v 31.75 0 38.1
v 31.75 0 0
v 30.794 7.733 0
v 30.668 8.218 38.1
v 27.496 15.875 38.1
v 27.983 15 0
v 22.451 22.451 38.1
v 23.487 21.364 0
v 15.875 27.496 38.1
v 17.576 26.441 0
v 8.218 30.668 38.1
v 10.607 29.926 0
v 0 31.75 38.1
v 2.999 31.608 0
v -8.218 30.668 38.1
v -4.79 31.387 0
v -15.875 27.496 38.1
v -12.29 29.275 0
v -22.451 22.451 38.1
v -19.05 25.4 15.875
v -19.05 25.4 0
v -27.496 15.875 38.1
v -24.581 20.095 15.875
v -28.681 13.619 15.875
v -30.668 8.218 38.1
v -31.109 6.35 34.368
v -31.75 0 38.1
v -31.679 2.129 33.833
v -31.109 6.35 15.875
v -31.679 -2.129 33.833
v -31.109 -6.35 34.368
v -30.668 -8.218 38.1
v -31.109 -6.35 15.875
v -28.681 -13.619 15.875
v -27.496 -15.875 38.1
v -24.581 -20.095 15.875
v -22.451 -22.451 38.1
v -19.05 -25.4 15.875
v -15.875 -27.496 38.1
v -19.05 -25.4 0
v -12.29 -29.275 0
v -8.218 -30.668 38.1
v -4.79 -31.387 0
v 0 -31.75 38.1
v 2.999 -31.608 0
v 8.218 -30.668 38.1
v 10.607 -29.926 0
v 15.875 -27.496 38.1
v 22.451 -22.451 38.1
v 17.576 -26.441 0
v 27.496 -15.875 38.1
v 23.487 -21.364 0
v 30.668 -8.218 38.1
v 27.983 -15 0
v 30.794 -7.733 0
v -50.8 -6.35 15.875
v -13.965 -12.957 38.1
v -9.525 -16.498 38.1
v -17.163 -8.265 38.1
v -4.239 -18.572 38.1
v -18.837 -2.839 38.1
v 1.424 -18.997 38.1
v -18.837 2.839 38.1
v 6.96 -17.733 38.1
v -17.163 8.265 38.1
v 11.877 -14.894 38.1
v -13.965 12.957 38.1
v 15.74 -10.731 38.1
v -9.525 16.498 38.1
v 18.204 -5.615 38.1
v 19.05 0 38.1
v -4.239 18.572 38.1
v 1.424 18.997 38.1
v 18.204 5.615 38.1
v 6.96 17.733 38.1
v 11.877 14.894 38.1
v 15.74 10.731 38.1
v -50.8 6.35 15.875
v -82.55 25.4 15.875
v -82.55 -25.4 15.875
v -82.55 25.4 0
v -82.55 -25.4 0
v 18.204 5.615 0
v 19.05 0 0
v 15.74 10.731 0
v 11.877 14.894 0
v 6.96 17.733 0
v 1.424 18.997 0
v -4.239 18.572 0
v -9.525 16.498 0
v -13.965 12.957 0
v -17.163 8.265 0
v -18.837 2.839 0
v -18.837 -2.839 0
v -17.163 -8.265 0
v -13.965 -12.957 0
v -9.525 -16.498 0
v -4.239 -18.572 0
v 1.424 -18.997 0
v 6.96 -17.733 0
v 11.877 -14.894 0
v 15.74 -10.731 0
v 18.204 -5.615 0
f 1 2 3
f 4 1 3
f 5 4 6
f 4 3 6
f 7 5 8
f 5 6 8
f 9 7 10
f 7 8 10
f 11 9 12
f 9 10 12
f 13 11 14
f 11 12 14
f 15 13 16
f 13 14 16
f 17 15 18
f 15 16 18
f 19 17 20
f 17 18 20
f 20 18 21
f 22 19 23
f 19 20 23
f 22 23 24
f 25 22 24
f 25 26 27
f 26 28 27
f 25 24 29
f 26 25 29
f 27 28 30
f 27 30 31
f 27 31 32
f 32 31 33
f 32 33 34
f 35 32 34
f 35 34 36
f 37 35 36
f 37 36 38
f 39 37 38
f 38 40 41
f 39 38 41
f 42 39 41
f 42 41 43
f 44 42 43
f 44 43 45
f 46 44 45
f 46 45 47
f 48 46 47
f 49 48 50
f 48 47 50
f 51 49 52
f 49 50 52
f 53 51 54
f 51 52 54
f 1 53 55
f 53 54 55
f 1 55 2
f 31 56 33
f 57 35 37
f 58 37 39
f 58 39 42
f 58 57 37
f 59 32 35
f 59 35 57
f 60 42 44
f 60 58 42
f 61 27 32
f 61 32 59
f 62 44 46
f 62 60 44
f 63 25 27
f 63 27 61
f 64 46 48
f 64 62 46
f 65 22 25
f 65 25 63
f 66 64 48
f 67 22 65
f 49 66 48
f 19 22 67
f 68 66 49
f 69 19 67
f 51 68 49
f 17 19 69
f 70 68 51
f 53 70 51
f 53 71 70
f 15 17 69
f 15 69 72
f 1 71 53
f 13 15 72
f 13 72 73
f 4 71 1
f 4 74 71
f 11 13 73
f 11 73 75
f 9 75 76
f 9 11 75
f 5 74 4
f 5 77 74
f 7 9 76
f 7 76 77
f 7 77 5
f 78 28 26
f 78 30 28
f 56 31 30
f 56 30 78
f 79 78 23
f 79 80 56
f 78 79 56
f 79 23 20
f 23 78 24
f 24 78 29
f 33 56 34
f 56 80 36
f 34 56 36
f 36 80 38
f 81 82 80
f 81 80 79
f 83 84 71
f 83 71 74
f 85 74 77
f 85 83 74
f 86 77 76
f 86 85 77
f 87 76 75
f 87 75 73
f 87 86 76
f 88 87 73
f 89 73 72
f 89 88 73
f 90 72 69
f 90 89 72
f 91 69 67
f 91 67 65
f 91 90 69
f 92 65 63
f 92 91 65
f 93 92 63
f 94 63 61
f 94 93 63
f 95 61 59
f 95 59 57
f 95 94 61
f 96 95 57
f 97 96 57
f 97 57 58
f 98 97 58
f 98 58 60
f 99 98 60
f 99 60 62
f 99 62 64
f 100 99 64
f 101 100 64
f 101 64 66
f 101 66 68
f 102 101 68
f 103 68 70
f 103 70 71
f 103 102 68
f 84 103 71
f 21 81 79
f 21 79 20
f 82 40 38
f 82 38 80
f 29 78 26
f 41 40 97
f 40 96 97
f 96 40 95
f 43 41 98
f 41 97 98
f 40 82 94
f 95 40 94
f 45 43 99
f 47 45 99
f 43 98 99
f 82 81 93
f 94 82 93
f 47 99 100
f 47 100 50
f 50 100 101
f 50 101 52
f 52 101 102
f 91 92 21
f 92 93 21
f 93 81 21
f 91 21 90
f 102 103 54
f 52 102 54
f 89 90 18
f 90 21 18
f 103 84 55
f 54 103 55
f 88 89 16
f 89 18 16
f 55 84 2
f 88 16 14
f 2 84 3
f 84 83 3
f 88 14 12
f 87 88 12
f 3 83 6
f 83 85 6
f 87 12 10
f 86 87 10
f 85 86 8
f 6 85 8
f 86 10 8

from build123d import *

# Parameters (mm, degrees)
F0_R     = 31.75
F0_R_2   = 19.05
F1_DEPTH = 38.1
F3_DEPTH = 15.875
F5_DEPTH = 6.35


with BuildPart() as f1:
    # F0 (on Top) → F1 (new body)
    with BuildSketch(Plane.XY):
        Circle(F0_R)
        Circle(F0_R_2, mode=Mode.SUBTRACT)
    extrude(amount=F1_DEPTH)

    # F2 (on face) → F3 (join)
    with BuildSketch(Plane(origin=(0, 0, 0), x_dir=(1, 0, 0), z_dir=(0, 0, -1))):
        with BuildLine():
            Line((-82.55, -25.4), (-19.05, -25.4))
            ThreePointArc((-19.05, -25.4), (-31.75, 0), (-19.05, 25.4))
            Line((-19.05, 25.4), (-82.55, 25.4))
            Line((-82.55, 25.4), (-82.55, -25.4))
        make_face()
    extrude(amount=-F3_DEPTH)

    # F4 (on Front) → F5 (join, symmetric)
    with BuildSketch(Plane.XZ):
        Polygon((-30.745536, 34.708899), (-50.8, 15.875), (-30.745536, 15.875), align=None)
    extrude(amount=F5_DEPTH, both=True)


solid = f1.part
